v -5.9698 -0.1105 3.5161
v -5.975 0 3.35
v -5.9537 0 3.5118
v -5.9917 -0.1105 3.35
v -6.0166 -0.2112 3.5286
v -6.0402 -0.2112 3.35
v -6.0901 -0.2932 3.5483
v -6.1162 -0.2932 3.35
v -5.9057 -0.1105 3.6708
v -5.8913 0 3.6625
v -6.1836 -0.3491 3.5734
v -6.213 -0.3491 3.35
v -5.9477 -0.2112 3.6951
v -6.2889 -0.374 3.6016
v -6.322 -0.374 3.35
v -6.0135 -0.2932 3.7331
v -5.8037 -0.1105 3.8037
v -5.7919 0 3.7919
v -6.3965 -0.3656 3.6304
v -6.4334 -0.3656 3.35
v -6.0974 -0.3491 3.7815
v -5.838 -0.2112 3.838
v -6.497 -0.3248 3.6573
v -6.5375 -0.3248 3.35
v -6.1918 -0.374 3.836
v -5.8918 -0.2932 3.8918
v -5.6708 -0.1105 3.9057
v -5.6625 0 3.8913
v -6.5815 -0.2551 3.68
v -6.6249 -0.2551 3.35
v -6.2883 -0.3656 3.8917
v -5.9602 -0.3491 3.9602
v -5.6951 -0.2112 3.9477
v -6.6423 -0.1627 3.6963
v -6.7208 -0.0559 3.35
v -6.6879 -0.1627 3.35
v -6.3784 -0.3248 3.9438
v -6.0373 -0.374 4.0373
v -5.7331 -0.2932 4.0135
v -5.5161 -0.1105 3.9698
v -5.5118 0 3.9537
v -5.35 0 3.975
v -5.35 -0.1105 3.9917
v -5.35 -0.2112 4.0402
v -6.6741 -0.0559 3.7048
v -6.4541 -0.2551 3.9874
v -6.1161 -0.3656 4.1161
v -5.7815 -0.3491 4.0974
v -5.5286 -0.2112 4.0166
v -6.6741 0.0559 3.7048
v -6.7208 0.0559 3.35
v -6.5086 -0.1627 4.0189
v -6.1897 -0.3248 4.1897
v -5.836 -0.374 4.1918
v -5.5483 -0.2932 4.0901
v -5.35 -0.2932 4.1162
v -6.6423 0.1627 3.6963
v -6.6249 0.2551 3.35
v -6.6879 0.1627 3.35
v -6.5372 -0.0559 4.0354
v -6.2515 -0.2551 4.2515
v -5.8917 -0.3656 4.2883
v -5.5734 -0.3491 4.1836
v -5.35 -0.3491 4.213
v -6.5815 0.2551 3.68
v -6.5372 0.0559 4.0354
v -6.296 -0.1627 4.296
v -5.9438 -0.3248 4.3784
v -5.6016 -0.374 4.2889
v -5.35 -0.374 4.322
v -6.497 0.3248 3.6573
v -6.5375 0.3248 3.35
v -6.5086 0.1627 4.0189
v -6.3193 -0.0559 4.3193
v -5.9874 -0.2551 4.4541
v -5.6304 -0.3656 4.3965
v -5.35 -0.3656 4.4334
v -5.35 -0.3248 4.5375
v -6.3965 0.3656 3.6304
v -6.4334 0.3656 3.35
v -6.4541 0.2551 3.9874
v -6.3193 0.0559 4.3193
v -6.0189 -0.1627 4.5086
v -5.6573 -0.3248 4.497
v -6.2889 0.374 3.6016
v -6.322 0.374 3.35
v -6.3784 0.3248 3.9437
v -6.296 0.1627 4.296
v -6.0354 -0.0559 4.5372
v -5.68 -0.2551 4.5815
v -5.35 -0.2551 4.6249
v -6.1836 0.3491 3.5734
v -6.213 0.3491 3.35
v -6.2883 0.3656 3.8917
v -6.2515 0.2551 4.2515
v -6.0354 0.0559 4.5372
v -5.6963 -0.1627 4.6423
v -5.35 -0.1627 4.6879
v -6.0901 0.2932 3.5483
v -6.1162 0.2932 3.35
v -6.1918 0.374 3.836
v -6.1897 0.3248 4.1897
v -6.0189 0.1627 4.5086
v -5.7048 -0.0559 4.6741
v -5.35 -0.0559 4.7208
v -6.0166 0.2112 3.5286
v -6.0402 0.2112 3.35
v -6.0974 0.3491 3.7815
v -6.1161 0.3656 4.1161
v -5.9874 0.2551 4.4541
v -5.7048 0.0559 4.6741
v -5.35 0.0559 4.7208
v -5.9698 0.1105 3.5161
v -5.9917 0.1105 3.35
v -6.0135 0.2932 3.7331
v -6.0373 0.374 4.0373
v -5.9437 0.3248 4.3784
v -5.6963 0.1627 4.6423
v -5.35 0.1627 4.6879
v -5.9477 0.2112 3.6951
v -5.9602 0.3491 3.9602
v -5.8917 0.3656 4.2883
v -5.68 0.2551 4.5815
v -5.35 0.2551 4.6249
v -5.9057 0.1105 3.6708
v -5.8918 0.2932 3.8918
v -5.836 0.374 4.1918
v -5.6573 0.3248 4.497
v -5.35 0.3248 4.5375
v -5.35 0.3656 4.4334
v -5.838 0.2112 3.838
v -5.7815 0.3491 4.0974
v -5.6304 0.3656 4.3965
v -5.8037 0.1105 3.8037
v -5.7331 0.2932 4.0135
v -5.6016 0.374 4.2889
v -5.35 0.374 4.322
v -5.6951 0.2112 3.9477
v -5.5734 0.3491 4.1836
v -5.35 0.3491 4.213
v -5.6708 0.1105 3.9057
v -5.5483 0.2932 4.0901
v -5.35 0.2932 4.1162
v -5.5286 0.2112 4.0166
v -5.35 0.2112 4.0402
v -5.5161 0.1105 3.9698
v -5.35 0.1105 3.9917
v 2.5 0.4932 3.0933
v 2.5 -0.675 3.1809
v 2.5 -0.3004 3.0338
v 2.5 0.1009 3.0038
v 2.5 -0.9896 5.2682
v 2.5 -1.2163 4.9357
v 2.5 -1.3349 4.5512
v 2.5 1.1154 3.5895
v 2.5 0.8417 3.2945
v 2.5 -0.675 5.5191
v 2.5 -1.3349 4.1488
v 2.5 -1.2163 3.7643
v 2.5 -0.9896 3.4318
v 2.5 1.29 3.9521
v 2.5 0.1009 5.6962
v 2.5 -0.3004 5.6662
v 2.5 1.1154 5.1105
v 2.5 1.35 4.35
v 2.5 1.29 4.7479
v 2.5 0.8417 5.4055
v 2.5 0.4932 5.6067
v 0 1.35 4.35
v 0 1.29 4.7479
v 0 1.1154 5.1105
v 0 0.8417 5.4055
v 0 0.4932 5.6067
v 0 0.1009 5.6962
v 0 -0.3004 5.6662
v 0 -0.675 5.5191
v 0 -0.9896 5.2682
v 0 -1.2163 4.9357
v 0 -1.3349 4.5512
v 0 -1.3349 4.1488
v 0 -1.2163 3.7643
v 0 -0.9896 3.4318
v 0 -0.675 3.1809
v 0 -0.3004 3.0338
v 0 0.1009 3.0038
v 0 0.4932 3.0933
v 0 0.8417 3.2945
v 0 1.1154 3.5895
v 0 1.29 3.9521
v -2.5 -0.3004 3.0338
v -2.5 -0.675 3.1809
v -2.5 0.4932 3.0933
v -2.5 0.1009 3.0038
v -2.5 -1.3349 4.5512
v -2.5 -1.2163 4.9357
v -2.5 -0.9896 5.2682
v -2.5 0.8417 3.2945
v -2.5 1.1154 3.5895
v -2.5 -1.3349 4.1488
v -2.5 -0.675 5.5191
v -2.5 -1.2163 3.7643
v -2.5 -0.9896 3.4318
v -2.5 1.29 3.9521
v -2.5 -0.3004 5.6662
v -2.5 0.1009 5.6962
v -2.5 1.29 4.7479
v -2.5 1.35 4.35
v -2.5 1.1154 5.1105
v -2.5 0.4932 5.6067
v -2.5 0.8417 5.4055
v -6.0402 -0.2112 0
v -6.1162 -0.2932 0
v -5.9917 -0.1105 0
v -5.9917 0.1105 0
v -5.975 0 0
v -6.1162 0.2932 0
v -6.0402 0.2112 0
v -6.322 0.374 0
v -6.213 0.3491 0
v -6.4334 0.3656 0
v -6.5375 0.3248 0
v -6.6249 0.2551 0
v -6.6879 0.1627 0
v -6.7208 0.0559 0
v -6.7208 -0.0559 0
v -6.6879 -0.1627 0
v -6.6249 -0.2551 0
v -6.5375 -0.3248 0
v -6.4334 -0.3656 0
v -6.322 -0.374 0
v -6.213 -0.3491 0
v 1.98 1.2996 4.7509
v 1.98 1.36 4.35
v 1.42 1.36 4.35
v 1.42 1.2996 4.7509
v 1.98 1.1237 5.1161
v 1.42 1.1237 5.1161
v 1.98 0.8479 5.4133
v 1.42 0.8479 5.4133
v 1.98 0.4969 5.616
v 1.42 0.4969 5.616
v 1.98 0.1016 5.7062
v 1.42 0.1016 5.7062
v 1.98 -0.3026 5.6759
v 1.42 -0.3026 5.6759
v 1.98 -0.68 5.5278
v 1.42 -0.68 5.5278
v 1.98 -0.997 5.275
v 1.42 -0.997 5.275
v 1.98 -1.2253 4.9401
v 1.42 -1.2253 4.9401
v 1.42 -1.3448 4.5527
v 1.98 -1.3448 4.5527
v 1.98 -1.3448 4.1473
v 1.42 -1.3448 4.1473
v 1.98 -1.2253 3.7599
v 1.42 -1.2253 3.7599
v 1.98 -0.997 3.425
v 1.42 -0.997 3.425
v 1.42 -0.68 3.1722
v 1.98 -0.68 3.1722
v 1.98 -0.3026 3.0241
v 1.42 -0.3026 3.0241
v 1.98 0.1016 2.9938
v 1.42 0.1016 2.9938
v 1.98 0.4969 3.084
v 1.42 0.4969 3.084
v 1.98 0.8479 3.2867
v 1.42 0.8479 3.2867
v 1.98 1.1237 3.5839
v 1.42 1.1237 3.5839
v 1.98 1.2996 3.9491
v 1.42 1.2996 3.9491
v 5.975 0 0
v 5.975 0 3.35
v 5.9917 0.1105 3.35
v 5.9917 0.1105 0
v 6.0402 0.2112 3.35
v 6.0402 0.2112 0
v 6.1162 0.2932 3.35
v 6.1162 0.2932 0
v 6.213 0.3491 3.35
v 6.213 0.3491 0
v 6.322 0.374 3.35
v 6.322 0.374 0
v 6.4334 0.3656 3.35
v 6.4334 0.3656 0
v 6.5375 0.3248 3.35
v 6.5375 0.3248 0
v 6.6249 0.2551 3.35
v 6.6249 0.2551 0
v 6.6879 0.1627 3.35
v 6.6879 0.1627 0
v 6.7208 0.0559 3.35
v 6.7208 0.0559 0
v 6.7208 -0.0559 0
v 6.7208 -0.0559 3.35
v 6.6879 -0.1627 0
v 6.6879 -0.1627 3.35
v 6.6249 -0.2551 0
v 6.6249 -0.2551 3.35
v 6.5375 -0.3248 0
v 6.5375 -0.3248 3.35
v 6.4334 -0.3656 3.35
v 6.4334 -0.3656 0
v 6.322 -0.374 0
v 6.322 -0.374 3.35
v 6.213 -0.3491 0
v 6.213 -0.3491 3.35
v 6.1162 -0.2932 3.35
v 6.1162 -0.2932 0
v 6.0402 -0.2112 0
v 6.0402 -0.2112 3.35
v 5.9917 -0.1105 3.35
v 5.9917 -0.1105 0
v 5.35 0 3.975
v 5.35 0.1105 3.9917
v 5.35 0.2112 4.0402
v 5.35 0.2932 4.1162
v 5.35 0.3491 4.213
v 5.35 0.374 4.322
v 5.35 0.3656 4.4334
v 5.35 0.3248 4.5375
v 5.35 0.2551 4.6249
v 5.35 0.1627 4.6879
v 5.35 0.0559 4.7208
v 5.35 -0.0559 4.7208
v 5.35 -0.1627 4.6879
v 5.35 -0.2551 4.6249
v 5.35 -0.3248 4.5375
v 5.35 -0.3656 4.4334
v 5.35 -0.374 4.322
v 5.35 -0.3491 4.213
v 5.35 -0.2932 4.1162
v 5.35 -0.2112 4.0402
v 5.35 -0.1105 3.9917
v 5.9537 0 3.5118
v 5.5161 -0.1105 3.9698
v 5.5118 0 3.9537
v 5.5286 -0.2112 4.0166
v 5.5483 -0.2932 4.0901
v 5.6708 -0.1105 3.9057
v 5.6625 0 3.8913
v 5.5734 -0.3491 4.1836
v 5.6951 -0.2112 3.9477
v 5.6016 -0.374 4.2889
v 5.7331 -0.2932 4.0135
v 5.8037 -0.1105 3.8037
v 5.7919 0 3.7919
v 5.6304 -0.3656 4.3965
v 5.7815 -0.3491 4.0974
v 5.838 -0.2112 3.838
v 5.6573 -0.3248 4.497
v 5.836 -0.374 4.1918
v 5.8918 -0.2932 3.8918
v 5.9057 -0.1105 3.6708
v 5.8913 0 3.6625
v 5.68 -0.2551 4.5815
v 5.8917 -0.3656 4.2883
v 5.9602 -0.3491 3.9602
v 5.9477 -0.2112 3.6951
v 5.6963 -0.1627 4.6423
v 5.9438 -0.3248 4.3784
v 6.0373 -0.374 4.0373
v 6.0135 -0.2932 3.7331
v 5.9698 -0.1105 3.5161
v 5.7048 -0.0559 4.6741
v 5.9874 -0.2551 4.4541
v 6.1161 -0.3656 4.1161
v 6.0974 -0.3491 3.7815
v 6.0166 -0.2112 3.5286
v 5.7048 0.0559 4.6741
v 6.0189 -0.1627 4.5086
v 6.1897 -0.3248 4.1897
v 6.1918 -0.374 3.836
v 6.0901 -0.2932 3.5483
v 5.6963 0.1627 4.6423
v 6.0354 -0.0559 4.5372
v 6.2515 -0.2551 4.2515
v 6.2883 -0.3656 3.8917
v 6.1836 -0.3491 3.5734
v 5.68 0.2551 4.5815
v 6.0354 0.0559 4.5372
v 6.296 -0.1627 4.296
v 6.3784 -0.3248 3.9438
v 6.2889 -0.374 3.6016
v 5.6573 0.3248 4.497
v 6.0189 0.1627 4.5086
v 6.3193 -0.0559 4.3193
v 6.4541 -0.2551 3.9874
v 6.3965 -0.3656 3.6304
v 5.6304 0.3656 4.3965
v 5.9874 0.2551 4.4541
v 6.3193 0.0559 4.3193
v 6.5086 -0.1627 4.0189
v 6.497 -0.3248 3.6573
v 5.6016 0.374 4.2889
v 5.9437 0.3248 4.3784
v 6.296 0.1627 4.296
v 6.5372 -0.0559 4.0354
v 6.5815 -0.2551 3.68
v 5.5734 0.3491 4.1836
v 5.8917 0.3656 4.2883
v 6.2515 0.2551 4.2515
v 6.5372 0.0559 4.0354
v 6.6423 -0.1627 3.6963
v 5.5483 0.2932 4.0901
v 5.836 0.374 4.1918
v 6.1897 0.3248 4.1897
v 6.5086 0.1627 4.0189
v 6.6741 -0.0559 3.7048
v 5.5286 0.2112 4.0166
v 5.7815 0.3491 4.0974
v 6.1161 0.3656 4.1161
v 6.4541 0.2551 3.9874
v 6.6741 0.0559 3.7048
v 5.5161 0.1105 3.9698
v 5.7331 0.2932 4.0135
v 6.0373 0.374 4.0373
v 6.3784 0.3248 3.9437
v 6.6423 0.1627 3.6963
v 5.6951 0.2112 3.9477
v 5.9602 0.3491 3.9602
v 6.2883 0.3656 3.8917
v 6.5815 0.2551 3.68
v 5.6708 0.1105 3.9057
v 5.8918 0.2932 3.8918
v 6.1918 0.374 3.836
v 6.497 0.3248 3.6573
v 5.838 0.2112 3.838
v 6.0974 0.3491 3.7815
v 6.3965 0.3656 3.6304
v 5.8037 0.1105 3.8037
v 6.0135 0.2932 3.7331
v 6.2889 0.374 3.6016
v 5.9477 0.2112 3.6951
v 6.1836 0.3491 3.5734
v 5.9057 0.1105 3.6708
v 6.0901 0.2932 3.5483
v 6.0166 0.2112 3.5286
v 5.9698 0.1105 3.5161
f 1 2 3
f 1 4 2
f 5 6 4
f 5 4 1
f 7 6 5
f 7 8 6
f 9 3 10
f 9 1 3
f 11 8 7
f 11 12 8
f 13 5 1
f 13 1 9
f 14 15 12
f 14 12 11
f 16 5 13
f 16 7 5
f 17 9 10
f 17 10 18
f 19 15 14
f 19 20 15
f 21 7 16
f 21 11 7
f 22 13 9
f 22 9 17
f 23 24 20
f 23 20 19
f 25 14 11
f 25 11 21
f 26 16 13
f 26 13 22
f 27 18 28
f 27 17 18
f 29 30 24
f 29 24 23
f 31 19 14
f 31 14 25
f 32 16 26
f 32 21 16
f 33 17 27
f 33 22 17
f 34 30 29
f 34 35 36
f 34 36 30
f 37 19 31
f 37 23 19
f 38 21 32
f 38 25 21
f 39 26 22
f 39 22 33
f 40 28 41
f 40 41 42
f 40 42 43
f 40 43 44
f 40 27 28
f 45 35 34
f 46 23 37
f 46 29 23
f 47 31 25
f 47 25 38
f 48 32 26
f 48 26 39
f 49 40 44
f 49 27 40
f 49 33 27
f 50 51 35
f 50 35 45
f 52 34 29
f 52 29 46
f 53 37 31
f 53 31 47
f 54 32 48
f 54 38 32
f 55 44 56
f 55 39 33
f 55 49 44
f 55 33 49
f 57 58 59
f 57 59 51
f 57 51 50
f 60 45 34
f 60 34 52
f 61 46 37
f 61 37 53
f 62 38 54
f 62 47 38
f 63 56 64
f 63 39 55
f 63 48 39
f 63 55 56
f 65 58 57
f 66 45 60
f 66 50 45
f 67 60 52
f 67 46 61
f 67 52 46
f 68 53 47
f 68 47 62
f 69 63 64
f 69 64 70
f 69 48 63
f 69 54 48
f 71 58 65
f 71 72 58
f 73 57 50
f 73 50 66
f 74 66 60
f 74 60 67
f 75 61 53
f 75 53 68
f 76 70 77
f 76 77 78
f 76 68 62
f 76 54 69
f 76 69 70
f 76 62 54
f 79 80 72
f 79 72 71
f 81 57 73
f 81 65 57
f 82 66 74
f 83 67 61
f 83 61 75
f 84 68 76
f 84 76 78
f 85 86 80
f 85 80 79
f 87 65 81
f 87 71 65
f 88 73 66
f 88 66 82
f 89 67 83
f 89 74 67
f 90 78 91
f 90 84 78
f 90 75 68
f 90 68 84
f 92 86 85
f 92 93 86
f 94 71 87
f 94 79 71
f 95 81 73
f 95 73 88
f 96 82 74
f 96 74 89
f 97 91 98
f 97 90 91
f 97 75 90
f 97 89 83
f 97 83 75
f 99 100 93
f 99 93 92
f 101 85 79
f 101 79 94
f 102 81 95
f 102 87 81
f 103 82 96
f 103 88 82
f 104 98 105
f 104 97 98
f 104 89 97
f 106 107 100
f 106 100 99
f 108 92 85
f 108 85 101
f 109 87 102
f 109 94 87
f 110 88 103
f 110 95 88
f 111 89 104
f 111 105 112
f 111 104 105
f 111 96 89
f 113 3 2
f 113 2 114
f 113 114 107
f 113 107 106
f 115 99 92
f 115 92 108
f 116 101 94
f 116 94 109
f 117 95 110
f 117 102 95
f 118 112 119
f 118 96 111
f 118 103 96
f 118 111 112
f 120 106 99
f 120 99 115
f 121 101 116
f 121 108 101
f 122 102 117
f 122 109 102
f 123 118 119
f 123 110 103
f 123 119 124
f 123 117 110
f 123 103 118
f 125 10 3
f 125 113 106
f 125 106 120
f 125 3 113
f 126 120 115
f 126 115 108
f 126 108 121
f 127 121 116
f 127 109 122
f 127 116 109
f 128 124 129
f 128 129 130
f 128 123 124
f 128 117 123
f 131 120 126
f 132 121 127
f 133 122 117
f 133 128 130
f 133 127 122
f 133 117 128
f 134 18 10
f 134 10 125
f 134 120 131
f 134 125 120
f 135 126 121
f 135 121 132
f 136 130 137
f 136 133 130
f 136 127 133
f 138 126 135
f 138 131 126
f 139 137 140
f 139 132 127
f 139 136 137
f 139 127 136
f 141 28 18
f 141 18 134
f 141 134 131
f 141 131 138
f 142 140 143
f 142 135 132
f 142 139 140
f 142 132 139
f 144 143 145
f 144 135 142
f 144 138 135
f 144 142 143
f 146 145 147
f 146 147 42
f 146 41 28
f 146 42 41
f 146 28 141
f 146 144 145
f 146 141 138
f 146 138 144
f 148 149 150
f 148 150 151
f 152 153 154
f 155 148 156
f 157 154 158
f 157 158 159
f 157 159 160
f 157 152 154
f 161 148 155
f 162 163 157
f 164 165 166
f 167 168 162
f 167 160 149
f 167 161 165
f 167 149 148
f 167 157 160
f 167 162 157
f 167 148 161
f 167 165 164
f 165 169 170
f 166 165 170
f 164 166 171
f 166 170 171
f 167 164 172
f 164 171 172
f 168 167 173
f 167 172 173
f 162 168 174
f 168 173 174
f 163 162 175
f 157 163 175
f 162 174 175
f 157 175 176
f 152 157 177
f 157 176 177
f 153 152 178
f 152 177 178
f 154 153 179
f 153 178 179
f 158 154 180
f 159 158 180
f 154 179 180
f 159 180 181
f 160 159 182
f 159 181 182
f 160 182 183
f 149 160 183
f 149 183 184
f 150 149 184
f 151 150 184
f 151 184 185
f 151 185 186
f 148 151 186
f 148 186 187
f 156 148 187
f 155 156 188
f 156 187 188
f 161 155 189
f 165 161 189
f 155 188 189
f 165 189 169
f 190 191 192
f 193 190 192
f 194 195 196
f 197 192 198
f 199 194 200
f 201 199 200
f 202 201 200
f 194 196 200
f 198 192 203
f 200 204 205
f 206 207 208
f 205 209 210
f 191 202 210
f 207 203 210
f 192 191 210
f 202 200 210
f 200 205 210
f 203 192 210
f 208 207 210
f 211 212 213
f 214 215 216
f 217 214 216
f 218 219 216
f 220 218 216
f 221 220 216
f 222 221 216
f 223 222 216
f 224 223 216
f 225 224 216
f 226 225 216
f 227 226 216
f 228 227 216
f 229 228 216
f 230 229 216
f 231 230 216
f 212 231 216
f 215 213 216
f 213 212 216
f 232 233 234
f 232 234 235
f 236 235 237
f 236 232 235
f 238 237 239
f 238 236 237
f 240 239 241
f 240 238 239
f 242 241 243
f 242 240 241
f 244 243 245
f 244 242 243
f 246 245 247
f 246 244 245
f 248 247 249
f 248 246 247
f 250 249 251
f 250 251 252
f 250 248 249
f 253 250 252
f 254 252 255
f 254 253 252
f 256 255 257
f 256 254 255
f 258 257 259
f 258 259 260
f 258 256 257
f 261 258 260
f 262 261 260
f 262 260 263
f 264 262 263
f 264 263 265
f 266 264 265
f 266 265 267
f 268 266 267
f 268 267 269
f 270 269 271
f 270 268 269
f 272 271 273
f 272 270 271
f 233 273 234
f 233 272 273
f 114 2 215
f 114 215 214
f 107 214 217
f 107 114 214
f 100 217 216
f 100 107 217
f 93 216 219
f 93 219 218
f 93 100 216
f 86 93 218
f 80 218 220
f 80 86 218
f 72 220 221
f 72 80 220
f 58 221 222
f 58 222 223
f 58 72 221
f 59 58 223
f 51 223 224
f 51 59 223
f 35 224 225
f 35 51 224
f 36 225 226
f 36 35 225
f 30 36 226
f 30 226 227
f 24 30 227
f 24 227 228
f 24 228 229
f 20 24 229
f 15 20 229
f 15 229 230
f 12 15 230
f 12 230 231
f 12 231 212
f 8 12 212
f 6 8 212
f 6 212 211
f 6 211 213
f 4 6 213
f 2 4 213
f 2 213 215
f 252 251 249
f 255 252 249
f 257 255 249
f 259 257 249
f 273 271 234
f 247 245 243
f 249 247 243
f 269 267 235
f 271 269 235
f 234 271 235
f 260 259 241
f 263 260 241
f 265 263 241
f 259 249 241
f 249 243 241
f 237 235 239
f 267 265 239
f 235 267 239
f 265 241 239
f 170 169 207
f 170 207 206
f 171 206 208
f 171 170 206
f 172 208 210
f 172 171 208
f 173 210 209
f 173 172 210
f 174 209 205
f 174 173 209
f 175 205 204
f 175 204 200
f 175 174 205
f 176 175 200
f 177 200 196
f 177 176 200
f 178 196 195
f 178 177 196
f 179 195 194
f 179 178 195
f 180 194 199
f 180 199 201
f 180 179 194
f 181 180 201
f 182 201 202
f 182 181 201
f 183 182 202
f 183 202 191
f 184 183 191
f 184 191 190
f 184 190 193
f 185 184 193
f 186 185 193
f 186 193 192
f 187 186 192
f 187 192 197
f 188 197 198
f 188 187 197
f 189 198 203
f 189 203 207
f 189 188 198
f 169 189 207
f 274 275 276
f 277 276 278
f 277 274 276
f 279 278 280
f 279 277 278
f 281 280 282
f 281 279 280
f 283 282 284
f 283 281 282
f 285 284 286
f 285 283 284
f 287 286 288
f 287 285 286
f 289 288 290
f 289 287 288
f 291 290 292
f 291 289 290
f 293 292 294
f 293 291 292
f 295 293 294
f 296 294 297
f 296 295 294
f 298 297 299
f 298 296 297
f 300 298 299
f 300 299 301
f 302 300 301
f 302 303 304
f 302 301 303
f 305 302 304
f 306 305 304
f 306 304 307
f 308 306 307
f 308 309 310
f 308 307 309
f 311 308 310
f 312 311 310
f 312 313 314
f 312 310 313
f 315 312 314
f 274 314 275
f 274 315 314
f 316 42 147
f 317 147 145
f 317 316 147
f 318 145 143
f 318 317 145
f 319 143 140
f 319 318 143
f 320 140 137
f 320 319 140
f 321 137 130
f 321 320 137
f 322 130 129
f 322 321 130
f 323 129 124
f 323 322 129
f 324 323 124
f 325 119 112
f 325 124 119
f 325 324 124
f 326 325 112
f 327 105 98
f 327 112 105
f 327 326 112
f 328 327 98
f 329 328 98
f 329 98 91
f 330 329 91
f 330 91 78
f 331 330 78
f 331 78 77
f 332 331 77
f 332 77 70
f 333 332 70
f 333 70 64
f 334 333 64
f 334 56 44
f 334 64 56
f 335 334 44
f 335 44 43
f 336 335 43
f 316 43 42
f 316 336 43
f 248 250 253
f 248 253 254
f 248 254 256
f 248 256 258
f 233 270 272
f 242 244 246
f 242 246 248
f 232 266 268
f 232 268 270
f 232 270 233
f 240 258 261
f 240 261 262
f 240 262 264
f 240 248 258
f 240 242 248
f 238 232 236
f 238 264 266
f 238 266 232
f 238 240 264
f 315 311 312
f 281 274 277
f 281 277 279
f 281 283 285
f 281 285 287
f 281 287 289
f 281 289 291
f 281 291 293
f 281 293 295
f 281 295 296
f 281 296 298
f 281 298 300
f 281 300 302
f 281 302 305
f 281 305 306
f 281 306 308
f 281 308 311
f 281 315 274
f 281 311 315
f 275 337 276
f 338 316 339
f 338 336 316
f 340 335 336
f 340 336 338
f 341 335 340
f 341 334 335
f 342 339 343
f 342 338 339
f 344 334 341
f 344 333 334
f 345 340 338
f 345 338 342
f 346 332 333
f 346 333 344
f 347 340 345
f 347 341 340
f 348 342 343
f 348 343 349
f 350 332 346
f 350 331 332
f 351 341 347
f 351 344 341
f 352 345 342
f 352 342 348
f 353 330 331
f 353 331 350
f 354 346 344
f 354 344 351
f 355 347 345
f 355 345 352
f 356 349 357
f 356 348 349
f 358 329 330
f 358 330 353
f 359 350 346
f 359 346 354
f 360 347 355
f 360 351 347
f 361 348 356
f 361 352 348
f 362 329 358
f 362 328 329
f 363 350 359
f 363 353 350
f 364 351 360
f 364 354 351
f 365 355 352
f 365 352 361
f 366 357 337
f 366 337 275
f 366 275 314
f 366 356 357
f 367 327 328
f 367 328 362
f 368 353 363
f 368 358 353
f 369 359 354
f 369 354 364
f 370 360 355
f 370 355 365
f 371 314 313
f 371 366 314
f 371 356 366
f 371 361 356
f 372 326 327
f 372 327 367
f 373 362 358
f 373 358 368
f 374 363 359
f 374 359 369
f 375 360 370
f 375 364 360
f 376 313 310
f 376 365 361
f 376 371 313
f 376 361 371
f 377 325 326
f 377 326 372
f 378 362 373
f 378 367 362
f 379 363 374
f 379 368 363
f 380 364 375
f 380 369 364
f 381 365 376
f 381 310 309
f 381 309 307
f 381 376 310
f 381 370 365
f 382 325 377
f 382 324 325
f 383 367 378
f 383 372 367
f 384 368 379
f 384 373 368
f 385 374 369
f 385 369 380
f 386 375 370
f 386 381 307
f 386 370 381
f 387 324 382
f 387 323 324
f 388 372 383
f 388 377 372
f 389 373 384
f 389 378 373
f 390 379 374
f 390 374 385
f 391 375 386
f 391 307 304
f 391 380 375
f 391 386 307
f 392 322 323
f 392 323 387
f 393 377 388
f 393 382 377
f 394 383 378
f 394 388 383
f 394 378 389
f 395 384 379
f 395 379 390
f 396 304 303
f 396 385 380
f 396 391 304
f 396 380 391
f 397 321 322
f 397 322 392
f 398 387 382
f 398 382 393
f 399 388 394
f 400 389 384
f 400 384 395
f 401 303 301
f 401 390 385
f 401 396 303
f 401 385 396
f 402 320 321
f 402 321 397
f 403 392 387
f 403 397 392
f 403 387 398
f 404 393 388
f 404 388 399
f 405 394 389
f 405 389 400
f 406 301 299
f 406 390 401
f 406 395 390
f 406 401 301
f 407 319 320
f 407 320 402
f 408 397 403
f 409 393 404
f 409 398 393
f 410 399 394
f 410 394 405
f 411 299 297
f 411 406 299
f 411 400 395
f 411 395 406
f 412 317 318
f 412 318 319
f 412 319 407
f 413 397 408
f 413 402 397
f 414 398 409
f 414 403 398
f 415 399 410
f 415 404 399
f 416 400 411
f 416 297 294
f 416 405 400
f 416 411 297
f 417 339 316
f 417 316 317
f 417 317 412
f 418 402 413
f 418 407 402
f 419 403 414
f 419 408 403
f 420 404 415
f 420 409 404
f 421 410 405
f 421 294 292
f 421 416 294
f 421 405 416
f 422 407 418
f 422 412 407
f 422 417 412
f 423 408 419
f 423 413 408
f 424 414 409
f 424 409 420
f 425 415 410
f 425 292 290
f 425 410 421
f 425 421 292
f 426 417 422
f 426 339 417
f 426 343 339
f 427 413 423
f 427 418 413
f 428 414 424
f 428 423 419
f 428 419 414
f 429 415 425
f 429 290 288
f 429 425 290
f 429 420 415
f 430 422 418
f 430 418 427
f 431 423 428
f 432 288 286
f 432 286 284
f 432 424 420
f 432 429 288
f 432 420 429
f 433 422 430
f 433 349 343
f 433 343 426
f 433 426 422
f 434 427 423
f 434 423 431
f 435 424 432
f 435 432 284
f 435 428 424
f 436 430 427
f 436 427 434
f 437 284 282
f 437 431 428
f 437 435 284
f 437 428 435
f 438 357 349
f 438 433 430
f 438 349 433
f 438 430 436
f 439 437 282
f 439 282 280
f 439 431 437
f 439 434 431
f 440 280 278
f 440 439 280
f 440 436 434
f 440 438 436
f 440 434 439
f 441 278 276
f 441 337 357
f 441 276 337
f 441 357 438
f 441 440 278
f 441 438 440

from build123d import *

# Parameters (mm, degrees)
F1_R          = 0.375
F3_R          = 1.35
F4_DEPTH      = 2.5
F4_DEPTH_BACK = 2.5
F6_START      = -0.52
F5_R          = 1.36
F6_DEPTH      = 0.56


with BuildPart() as f2:
    # F2: sweep along a path in F0
    with BuildLine(Plane.XZ) as f2_path:
        Line((-6.35, 0), (-6.35, 3.35))
        ThreePointArc((-6.35, 3.35), (-6.0571067812, 4.0571067812), (-5.35, 4.35))
        Line((-5.35, 4.35), (5.35, 4.35))
        ThreePointArc((5.35, 4.35), (6.0571067812, 4.0571067812), (6.35, 3.35))
        Line((6.35, 3.35), (6.35, 0))
    # F1 (on Top) → F2 (sweep)
    with BuildSketch(Plane.XY):
        with Locations((-6.35, 0)):
            Circle(F1_R)
    sweep(path=f2_path.line)


with BuildPart() as f4:
    # F3 (on Right) → F4 (new body, two sides)
    with BuildSketch(Plane.YZ) as f4_sk:
        with Locations((0, 4.35)):
            Circle(F3_R)
    extrude(amount=-F4_DEPTH)
    extrude(f4_sk.sketch, amount=F4_DEPTH_BACK)


with BuildPart() as f6:
    # F5 (on face) → F6 (new body)
    with BuildSketch(Plane.YZ.offset(2.5).offset(F6_START)):
        with Locations((0, 4.35)):
            Circle(F5_R)
    extrude(amount=-F6_DEPTH)


solid = Compound([f2.part, f4.part, f6.part])
